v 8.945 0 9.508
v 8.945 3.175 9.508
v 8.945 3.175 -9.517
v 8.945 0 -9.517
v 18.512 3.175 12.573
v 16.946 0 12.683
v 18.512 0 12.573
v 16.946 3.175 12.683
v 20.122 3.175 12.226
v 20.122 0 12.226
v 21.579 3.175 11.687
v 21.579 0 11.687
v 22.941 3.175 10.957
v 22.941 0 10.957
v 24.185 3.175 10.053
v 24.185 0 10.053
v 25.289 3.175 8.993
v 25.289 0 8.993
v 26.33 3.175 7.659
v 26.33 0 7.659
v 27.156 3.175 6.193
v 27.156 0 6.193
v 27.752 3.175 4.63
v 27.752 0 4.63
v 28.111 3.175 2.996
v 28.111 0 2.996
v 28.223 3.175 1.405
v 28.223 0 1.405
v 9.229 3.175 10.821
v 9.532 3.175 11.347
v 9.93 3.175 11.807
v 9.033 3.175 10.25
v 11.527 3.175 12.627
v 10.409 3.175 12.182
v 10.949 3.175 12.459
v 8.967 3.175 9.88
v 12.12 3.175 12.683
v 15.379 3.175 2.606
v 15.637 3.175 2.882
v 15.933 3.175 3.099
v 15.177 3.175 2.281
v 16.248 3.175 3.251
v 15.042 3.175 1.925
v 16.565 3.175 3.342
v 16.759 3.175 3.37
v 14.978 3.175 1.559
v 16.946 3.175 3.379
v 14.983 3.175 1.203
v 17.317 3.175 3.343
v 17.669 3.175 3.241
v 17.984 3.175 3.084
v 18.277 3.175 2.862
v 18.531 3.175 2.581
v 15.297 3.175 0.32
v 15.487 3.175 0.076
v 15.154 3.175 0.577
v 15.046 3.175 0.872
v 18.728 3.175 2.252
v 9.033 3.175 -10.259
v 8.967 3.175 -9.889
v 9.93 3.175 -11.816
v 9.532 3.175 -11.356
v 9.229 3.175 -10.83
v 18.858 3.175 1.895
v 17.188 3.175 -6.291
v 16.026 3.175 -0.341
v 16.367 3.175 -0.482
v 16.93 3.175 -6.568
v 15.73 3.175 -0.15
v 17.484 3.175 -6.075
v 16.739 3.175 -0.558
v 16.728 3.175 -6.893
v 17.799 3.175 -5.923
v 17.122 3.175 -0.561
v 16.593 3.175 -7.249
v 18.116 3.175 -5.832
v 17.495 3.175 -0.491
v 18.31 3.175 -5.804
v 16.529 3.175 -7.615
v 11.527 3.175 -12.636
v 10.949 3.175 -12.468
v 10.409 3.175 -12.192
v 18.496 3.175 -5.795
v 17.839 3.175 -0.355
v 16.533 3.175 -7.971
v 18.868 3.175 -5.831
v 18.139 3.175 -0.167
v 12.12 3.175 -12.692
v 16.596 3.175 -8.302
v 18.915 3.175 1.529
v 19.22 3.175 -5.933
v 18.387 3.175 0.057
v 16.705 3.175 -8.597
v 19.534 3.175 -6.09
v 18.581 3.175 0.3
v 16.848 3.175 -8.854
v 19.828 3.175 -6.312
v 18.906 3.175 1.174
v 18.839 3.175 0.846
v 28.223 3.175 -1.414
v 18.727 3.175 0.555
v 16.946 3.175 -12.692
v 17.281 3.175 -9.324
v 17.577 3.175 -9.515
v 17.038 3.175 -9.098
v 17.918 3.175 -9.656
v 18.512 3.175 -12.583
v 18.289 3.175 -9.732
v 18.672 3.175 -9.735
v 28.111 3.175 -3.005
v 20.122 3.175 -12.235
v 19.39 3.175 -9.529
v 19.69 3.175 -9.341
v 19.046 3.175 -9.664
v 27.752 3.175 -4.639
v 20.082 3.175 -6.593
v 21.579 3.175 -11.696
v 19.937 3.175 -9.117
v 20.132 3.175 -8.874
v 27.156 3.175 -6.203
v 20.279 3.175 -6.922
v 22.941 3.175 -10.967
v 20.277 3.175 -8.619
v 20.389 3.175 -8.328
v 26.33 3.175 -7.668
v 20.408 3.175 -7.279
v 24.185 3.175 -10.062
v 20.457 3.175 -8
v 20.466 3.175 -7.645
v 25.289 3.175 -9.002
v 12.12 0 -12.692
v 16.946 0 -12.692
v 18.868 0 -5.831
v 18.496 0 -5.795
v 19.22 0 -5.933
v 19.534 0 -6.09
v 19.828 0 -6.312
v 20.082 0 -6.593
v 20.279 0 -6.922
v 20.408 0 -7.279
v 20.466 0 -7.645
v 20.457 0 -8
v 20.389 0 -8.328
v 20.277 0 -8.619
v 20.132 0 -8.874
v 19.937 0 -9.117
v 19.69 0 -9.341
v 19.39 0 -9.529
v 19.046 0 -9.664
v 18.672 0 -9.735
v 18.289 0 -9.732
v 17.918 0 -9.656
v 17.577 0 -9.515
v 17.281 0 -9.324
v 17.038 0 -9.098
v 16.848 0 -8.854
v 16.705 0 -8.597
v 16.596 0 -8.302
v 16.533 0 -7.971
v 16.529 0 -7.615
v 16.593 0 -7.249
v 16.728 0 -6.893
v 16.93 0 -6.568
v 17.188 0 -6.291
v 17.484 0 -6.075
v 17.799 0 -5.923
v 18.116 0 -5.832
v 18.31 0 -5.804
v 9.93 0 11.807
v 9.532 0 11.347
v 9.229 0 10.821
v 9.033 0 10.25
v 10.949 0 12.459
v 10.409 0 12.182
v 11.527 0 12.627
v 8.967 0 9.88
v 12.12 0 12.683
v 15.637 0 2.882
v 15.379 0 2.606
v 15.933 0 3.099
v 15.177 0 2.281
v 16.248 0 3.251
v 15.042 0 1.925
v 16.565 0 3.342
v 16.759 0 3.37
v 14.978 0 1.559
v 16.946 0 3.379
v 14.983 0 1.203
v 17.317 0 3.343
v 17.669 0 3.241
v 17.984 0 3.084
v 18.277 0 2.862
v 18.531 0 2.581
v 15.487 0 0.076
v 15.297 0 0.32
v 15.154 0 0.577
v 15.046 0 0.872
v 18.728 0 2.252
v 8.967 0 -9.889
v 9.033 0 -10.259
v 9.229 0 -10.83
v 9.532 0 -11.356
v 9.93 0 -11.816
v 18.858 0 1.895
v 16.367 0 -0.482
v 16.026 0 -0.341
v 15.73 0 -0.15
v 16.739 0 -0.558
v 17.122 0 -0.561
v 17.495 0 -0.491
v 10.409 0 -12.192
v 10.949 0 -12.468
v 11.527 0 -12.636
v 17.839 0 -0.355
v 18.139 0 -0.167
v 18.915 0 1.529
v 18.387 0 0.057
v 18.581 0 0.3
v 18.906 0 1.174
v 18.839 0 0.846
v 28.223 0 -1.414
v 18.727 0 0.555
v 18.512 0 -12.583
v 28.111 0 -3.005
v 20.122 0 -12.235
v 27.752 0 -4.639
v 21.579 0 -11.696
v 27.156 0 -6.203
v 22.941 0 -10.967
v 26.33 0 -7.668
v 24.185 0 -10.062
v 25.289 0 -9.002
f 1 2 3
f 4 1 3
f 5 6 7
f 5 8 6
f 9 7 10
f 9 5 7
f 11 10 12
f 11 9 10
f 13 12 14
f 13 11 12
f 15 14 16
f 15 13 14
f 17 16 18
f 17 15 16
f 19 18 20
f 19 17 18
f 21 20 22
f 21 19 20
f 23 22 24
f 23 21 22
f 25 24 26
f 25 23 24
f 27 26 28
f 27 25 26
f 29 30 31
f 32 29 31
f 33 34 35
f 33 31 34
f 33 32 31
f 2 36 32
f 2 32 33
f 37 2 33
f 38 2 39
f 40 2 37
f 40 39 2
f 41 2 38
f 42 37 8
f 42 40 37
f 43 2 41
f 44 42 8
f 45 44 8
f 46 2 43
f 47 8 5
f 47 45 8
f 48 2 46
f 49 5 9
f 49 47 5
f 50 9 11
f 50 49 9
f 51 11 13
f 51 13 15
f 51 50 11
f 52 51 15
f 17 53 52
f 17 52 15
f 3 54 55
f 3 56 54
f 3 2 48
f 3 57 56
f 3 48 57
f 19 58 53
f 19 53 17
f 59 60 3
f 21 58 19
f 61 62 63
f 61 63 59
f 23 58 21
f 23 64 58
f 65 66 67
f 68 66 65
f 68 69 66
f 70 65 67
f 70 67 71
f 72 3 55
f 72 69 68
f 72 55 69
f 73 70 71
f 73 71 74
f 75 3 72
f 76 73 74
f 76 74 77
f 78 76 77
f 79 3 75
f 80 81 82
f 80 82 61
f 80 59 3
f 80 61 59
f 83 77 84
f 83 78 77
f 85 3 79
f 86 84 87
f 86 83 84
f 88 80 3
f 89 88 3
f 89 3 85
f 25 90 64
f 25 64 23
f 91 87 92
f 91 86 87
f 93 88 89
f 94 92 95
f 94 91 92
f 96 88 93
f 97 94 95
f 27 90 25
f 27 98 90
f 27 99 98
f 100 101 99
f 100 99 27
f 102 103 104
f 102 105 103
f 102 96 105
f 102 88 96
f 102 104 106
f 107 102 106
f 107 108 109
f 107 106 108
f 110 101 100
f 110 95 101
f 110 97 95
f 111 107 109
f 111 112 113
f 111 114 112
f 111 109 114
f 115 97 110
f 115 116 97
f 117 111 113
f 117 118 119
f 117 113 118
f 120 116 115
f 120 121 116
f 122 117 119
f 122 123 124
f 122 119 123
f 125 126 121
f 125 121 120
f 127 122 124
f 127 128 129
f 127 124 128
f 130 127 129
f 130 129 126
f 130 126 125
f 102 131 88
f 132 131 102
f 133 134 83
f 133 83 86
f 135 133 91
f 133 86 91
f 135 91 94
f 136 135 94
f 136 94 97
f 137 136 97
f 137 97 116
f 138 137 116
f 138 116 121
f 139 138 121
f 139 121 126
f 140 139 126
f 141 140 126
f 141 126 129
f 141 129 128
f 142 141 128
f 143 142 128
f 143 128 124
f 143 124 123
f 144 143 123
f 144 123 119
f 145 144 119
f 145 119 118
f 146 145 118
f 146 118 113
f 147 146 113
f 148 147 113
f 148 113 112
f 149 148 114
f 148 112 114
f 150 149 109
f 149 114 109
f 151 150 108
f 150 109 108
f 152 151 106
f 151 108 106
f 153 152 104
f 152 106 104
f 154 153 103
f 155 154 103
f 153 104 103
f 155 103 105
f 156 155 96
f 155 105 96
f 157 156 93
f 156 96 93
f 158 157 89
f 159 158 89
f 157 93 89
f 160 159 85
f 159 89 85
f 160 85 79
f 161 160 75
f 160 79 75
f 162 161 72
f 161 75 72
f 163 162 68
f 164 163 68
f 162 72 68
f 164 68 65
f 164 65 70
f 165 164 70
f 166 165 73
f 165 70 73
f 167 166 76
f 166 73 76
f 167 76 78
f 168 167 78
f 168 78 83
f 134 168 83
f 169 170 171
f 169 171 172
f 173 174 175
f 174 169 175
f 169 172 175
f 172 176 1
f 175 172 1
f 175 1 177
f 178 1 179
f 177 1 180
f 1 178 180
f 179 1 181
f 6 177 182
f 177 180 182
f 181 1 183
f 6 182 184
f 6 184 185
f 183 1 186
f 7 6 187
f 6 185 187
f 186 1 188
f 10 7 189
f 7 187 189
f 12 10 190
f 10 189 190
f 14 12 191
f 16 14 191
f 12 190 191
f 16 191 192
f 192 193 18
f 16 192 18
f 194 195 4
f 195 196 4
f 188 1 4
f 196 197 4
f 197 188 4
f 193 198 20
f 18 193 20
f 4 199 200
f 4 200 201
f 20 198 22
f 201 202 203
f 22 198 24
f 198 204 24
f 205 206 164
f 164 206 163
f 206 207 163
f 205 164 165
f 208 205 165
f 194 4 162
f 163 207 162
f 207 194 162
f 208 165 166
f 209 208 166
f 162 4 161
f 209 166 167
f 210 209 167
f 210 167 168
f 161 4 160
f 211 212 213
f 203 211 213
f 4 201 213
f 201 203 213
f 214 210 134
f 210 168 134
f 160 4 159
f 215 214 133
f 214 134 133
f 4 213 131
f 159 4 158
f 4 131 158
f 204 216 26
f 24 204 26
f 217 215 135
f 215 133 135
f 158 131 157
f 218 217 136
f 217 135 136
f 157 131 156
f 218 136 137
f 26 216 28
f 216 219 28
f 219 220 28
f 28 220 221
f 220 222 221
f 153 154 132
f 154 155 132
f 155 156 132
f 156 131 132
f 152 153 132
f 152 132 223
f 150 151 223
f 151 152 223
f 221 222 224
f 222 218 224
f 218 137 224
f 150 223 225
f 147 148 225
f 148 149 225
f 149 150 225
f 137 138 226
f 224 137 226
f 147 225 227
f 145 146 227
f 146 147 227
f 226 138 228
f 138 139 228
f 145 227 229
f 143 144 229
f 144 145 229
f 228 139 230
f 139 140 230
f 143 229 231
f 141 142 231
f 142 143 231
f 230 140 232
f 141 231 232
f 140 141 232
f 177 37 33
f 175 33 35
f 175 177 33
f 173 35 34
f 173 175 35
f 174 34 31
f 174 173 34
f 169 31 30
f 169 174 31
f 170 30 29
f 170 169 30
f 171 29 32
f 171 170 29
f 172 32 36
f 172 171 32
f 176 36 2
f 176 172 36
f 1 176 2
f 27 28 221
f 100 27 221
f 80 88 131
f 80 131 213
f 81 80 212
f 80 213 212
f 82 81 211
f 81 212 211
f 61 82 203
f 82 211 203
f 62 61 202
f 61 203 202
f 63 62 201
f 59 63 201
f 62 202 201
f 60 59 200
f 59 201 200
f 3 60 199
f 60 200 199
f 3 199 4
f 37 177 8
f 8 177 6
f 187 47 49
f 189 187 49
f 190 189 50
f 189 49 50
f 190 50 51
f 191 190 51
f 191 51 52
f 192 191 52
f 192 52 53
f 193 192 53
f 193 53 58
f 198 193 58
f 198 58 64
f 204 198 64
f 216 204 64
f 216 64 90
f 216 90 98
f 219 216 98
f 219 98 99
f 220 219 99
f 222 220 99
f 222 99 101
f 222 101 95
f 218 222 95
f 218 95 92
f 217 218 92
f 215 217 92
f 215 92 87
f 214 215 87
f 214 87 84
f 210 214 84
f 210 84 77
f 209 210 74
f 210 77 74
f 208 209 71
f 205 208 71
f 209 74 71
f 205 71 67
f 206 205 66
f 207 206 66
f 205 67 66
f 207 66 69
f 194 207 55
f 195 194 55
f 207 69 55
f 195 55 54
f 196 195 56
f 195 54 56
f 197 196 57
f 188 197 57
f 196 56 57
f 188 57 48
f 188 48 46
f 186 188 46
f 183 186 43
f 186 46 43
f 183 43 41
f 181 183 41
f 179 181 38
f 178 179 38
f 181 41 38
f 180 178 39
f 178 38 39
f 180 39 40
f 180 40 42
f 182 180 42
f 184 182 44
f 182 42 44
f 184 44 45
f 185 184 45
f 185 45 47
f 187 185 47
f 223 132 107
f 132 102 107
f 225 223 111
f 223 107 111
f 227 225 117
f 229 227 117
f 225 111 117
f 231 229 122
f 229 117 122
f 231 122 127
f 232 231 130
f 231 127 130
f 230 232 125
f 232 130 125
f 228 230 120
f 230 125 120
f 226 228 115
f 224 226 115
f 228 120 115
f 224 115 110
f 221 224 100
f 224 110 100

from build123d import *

# Parameters (mm, degrees)
SKETCH1_W           = 50.8
SKETCH1_H           = 22.86
BOSS_EXTRUDE1_DEPTH = 3.175
FILLET1_R           = 10.16
SKETCH3_R           = 1.778
CUT_EXTRUDE1_DEPTH  = 29.033649869
FILLET3_R           = 10.16
SCALE1_SCALE_X      = 1.11
SCALE1_SCALE_Y      = 1
SCALE1_SCALE_Z      = 1.11
SKETCH4_W           = 37.109402391
SKETCH4_H           = 25.3746
CUT_EXTRUDE2_DEPTH  = 32.108311229
FILLET4_R           = 3.175


with BuildPart() as part:
    # Sketch1 → Boss-Extrude1 (new body)
    with BuildSketch(Plane(origin=(0, 0, 0), x_dir=(1, 0, 0), z_dir=(0, 1, 0))):
        Rectangle(SKETCH1_W, SKETCH1_H)
    extrude(amount=BOSS_EXTRUDE1_DEPTH)

    # Fillet1
    fillet1_edges = [part.edges().sort_by_distance(p)[0] for p in [
        (25.4, 1.5875, 11.43),
        (-25.4, 1.5875, 11.43),
    ]]
    fillet(fillet1_edges, radius=FILLET1_R)

    # Sketch3 → Cut-Extrude1 (cut, through all)
    with BuildSketch(Plane(origin=(0, 3.175, 0), x_dir=(1, 0, 0), z_dir=(0, 1, 0))):
        with Locations(Location((15.24, -1.27, 0), (0, 0, 270))):
            Circle(SKETCH3_R)
        with Locations(Location((16.637, 6.994763457, 0), (0, 0, 270))):
            Circle(SKETCH3_R)
        with Locations(Location((-3.81, -1.27, 0), (0, 0, 270))):
            Circle(SKETCH3_R)
    extrude(amount=-CUT_EXTRUDE1_DEPTH, mode=Mode.SUBTRACT)

    # Fillet3
    fillet3_edges = [part.edges().sort_by_distance(p)[0] for p in [
        (-25.4, 1.5875, -11.43),
        (25.4, 1.5875, -11.43),
    ]]
    fillet(fillet3_edges, radius=FILLET3_R)


with BuildPart() as part_1:
    # Scale1: scaled about (-0.267284258, 1.5875, 0.042423064)
    add(part.part.scale((SCALE1_SCALE_X, SCALE1_SCALE_Y, SCALE1_SCALE_Z), about=(-0.267284258, 1.5875, 0.042423064)))

    # Sketch4 → Cut-Extrude2 (cut, through all)
    with BuildSketch(Plane(origin=(0, 3.175, 0), x_dir=(1, 0, 0), z_dir=(0, 1, 0))):
        with Locations((-9.609897537, 0.004666537)):
            Rectangle(SKETCH4_W, SKETCH4_H)
    extrude(amount=-CUT_EXTRUDE2_DEPTH, mode=Mode.SUBTRACT)

    # Fillet4
    fillet4_edges = [part_1.edges().sort_by_distance(p)[0] for p in [
        (8.944803659, 1.5875, 12.682633463),
        (8.944803659, 1.5875, -12.691966537),
    ]]
    fillet(fillet4_edges, radius=FILLET4_R)


solid = part_1.part
